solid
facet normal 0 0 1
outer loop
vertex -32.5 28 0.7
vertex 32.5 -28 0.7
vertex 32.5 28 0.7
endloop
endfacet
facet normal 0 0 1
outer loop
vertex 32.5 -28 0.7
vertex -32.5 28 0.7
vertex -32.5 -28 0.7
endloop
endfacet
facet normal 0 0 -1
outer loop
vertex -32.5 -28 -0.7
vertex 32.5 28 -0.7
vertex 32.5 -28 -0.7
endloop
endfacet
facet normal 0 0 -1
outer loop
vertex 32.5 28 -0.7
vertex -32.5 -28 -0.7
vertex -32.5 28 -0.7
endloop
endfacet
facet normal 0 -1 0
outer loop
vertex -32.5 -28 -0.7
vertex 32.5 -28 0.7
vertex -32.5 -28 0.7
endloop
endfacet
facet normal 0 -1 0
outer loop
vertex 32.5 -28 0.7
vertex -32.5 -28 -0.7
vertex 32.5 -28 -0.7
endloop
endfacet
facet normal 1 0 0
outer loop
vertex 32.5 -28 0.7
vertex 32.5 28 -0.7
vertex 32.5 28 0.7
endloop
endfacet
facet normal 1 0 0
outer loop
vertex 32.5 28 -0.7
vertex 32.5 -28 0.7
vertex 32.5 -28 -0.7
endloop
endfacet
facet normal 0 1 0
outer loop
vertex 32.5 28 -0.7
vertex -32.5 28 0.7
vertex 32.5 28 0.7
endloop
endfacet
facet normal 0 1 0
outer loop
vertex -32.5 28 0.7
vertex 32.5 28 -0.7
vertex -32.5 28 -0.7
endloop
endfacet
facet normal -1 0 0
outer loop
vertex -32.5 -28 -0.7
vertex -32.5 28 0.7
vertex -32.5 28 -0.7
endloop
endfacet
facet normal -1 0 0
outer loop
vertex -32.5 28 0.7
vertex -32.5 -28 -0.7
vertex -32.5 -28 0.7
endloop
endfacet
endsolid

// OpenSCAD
// Parameters
pcb_length = 65; //[32.5:130:0.5]
pcb_width = 56; //[28:112:0.5]
pcb_thickness = 1.4; //[0.7:2.8:0.1]

// Main PCB Body
module pcb_main_body() {
  color([0.0, 0.4, 0.2]) // Green color for PCB
  cube([pcb_length, pcb_width, pcb_thickness], center=true);
}

// Complete SBC Model
module sbc_complete_model() {
  pcb_main_body();
}

// Render the final model
sbc_complete_model();
